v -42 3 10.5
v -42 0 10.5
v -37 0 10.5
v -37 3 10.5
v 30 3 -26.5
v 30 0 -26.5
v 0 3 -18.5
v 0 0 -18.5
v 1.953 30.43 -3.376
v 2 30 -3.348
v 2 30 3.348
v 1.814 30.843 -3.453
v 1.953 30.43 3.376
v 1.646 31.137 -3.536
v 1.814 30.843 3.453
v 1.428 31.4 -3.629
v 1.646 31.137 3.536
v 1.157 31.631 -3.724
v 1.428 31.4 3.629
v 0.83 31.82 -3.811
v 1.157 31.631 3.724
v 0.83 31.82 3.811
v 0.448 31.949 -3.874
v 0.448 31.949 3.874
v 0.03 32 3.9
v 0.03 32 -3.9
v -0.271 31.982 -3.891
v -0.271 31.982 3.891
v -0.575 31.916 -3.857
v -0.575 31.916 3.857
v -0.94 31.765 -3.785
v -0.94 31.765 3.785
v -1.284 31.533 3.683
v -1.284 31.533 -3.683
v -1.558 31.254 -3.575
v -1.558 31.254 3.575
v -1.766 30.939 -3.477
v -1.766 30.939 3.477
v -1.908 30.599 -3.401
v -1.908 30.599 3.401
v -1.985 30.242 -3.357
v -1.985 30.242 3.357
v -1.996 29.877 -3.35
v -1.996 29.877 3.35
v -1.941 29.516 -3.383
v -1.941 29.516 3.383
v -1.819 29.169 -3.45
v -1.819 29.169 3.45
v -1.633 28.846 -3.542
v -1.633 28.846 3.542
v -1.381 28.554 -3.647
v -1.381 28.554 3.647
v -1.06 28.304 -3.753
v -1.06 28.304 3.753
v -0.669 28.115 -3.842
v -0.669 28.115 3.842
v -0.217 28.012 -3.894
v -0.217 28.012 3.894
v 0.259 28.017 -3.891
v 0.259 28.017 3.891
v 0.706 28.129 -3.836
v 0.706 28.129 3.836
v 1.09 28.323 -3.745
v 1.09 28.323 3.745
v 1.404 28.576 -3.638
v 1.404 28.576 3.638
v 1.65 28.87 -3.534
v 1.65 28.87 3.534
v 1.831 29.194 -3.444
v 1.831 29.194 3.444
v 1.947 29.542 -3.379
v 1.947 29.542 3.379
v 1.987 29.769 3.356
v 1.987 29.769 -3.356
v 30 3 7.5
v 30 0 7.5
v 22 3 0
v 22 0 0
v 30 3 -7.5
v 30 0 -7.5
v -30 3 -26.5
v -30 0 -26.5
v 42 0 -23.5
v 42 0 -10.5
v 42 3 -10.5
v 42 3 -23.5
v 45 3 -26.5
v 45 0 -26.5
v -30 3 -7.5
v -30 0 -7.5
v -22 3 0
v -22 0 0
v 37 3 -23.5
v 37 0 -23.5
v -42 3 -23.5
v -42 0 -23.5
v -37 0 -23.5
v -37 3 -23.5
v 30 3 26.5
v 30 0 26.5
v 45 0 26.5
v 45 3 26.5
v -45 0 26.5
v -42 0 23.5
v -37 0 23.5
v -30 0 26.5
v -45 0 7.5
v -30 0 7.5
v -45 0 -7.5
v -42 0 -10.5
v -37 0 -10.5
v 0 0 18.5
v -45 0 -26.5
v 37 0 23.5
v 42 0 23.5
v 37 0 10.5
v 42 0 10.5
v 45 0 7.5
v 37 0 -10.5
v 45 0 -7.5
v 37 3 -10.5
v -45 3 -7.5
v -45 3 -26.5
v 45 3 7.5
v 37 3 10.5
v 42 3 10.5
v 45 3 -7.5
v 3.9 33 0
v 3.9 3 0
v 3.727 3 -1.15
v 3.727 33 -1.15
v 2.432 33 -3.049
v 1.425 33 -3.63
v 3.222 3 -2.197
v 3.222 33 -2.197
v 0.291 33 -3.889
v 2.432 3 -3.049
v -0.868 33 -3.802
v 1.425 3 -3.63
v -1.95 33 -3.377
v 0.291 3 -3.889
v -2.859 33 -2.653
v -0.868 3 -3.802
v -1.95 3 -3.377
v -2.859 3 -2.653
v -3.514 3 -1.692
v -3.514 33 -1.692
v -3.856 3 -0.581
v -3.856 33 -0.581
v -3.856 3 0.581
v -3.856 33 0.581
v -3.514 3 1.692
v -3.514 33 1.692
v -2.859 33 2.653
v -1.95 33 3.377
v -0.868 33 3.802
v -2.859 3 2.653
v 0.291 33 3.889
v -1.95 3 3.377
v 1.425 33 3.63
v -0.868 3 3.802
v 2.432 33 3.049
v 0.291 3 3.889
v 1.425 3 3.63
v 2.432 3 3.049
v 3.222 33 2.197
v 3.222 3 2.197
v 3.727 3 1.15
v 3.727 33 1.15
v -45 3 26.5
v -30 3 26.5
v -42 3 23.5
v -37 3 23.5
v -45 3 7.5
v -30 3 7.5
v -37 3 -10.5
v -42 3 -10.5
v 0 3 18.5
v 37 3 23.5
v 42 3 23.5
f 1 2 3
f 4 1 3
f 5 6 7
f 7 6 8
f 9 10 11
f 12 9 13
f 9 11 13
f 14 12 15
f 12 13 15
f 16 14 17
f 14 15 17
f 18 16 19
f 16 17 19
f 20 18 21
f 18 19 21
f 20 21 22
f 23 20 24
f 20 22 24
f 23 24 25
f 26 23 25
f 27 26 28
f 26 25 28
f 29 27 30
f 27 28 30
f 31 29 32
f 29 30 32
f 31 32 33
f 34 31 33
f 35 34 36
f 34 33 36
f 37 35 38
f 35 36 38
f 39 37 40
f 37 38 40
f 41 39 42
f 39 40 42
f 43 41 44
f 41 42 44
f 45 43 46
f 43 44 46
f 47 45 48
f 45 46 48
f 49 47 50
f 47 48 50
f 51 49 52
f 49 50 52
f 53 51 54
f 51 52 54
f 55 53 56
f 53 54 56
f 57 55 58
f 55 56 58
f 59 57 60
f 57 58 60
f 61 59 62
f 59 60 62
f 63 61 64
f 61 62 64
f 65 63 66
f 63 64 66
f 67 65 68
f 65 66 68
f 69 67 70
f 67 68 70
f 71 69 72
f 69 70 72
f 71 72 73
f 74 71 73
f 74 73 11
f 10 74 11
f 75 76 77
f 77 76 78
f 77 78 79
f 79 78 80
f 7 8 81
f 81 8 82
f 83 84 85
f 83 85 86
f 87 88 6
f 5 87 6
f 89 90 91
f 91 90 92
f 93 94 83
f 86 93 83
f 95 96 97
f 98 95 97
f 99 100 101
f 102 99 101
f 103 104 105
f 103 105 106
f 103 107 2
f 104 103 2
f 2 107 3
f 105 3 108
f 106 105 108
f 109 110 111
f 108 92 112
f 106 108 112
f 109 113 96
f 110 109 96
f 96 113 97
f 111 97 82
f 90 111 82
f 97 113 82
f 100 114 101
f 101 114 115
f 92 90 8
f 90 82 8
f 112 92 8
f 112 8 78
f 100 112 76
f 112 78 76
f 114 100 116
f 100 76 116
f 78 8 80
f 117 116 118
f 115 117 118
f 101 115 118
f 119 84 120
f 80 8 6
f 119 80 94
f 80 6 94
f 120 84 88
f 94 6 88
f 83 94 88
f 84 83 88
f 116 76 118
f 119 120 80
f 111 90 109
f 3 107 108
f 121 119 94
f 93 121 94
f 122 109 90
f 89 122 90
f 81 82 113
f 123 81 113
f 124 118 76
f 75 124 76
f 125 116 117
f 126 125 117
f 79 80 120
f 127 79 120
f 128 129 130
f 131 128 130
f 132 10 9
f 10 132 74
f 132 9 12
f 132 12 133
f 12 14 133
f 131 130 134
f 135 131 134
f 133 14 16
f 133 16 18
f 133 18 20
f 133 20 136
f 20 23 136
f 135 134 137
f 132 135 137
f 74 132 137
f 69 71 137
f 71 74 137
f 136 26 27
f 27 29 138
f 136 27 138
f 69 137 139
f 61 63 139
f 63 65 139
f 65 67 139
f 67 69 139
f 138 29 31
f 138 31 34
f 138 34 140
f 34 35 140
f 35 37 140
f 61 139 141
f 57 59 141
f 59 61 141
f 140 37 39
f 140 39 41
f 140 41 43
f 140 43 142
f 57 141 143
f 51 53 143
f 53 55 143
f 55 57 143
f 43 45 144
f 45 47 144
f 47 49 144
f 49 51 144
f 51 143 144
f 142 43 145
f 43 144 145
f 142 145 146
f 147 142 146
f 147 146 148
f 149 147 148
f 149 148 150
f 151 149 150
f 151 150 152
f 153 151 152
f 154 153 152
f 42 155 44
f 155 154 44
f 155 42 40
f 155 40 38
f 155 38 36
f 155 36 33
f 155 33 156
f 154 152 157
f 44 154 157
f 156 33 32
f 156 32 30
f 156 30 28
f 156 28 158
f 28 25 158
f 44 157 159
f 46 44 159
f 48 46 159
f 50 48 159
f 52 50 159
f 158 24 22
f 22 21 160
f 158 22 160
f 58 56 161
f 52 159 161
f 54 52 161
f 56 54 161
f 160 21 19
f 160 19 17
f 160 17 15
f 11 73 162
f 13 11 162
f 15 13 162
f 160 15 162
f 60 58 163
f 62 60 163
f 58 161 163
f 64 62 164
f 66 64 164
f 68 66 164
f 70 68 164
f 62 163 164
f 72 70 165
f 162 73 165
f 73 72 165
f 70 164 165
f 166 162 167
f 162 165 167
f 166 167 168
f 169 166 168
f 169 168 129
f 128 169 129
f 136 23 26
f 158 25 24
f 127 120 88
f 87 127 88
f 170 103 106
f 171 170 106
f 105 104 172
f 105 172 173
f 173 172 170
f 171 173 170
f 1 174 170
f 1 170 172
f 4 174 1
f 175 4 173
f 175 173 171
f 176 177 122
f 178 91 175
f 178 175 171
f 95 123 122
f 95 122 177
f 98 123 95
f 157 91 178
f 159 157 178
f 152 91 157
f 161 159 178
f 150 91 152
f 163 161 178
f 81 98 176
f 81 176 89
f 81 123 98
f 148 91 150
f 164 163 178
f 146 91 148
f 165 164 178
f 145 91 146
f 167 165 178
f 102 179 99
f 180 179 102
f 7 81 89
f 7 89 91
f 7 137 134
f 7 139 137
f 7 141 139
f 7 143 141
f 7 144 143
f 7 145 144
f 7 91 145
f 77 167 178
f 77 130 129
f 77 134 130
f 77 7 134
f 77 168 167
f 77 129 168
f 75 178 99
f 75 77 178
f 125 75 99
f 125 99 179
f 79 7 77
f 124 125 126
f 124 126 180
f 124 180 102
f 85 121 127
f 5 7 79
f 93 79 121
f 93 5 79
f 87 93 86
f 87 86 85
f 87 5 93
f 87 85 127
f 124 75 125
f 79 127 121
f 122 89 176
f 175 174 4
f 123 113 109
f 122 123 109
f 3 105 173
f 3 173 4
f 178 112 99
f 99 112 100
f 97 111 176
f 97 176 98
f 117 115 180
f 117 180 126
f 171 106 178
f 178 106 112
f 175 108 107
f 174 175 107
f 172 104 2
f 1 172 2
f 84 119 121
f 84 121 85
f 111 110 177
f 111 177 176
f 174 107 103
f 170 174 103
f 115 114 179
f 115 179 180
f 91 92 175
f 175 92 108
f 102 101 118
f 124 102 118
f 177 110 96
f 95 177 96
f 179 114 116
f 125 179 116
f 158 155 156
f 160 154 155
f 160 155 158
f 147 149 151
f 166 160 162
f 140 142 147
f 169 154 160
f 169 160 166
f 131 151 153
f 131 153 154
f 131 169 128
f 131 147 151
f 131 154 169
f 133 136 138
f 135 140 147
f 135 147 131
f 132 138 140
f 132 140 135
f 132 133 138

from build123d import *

# Parameters (mm, degrees)
CROQUIS1_W                 = 5
CROQUIS1_H                 = 13
SALIENTE_EXTRUIR1_DEPTH    = 3
CROQUIS9_R                 = 3.9
SALIENTE_EXTRUIR2_DEPTH    = 30
CROQUIS10_R                = 2
CORTAR_EXTRUIR7_DEPTH      = 27.5
CORTAR_EXTRUIR7_DEPTH_BACK = 27.5


with BuildPart() as part:
    # Croquis1 → Saliente-Extruir1 (new body)
    with BuildSketch(Plane(origin=(0, 0, 0), x_dir=(1, 0, 0), z_dir=(0, 1, 0))):
        Polygon((-45, -26.5), (-30, -26.5), (0, -18.5), (30, -26.5), (45, -26.5), (45, -7.5), (30, -7.5), (22, 0), (30, 7.5), (45, 7.5), (45, 26.5), (30, 26.5), (0, 18.5), (-30, 26.5), (-45, 26.5), (-45, 7.5), (-30, 7.5), (-22, 0), (-30, -7.5), (-45, -7.5), align=None)
        with Locations((39.5, -17)):
            Rectangle(CROQUIS1_W, CROQUIS1_H, mode=Mode.SUBTRACT)
        with Locations((39.5, 17)):
            Rectangle(CROQUIS1_W, CROQUIS1_H, mode=Mode.SUBTRACT)
        with Locations((-39.5, 17)):
            Rectangle(CROQUIS1_W, CROQUIS1_H, mode=Mode.SUBTRACT)
        with Locations((-39.5, -17)):
            Rectangle(CROQUIS1_W, CROQUIS1_H, mode=Mode.SUBTRACT)
    extrude(amount=SALIENTE_EXTRUIR1_DEPTH)

    # Croquis9 → Saliente-Extruir2 (add)
    with BuildSketch(Plane(origin=(0, 3, 0), x_dir=(1, 0, 0), z_dir=(0, 1, 0))):
        Circle(CROQUIS9_R)
    extrude(amount=SALIENTE_EXTRUIR2_DEPTH)

    # Croquis10 → Cortar-Extruir7 (cut, two sides)
    with BuildSketch(Plane.XY) as cortar_extruir7_sk:
        with Locations((0, 30)):
            Circle(CROQUIS10_R)
    extrude(amount=CORTAR_EXTRUIR7_DEPTH, mode=Mode.SUBTRACT)
    extrude(cortar_extruir7_sk.sketch, amount=-CORTAR_EXTRUIR7_DEPTH_BACK, mode=Mode.SUBTRACT)


solid = part.part
